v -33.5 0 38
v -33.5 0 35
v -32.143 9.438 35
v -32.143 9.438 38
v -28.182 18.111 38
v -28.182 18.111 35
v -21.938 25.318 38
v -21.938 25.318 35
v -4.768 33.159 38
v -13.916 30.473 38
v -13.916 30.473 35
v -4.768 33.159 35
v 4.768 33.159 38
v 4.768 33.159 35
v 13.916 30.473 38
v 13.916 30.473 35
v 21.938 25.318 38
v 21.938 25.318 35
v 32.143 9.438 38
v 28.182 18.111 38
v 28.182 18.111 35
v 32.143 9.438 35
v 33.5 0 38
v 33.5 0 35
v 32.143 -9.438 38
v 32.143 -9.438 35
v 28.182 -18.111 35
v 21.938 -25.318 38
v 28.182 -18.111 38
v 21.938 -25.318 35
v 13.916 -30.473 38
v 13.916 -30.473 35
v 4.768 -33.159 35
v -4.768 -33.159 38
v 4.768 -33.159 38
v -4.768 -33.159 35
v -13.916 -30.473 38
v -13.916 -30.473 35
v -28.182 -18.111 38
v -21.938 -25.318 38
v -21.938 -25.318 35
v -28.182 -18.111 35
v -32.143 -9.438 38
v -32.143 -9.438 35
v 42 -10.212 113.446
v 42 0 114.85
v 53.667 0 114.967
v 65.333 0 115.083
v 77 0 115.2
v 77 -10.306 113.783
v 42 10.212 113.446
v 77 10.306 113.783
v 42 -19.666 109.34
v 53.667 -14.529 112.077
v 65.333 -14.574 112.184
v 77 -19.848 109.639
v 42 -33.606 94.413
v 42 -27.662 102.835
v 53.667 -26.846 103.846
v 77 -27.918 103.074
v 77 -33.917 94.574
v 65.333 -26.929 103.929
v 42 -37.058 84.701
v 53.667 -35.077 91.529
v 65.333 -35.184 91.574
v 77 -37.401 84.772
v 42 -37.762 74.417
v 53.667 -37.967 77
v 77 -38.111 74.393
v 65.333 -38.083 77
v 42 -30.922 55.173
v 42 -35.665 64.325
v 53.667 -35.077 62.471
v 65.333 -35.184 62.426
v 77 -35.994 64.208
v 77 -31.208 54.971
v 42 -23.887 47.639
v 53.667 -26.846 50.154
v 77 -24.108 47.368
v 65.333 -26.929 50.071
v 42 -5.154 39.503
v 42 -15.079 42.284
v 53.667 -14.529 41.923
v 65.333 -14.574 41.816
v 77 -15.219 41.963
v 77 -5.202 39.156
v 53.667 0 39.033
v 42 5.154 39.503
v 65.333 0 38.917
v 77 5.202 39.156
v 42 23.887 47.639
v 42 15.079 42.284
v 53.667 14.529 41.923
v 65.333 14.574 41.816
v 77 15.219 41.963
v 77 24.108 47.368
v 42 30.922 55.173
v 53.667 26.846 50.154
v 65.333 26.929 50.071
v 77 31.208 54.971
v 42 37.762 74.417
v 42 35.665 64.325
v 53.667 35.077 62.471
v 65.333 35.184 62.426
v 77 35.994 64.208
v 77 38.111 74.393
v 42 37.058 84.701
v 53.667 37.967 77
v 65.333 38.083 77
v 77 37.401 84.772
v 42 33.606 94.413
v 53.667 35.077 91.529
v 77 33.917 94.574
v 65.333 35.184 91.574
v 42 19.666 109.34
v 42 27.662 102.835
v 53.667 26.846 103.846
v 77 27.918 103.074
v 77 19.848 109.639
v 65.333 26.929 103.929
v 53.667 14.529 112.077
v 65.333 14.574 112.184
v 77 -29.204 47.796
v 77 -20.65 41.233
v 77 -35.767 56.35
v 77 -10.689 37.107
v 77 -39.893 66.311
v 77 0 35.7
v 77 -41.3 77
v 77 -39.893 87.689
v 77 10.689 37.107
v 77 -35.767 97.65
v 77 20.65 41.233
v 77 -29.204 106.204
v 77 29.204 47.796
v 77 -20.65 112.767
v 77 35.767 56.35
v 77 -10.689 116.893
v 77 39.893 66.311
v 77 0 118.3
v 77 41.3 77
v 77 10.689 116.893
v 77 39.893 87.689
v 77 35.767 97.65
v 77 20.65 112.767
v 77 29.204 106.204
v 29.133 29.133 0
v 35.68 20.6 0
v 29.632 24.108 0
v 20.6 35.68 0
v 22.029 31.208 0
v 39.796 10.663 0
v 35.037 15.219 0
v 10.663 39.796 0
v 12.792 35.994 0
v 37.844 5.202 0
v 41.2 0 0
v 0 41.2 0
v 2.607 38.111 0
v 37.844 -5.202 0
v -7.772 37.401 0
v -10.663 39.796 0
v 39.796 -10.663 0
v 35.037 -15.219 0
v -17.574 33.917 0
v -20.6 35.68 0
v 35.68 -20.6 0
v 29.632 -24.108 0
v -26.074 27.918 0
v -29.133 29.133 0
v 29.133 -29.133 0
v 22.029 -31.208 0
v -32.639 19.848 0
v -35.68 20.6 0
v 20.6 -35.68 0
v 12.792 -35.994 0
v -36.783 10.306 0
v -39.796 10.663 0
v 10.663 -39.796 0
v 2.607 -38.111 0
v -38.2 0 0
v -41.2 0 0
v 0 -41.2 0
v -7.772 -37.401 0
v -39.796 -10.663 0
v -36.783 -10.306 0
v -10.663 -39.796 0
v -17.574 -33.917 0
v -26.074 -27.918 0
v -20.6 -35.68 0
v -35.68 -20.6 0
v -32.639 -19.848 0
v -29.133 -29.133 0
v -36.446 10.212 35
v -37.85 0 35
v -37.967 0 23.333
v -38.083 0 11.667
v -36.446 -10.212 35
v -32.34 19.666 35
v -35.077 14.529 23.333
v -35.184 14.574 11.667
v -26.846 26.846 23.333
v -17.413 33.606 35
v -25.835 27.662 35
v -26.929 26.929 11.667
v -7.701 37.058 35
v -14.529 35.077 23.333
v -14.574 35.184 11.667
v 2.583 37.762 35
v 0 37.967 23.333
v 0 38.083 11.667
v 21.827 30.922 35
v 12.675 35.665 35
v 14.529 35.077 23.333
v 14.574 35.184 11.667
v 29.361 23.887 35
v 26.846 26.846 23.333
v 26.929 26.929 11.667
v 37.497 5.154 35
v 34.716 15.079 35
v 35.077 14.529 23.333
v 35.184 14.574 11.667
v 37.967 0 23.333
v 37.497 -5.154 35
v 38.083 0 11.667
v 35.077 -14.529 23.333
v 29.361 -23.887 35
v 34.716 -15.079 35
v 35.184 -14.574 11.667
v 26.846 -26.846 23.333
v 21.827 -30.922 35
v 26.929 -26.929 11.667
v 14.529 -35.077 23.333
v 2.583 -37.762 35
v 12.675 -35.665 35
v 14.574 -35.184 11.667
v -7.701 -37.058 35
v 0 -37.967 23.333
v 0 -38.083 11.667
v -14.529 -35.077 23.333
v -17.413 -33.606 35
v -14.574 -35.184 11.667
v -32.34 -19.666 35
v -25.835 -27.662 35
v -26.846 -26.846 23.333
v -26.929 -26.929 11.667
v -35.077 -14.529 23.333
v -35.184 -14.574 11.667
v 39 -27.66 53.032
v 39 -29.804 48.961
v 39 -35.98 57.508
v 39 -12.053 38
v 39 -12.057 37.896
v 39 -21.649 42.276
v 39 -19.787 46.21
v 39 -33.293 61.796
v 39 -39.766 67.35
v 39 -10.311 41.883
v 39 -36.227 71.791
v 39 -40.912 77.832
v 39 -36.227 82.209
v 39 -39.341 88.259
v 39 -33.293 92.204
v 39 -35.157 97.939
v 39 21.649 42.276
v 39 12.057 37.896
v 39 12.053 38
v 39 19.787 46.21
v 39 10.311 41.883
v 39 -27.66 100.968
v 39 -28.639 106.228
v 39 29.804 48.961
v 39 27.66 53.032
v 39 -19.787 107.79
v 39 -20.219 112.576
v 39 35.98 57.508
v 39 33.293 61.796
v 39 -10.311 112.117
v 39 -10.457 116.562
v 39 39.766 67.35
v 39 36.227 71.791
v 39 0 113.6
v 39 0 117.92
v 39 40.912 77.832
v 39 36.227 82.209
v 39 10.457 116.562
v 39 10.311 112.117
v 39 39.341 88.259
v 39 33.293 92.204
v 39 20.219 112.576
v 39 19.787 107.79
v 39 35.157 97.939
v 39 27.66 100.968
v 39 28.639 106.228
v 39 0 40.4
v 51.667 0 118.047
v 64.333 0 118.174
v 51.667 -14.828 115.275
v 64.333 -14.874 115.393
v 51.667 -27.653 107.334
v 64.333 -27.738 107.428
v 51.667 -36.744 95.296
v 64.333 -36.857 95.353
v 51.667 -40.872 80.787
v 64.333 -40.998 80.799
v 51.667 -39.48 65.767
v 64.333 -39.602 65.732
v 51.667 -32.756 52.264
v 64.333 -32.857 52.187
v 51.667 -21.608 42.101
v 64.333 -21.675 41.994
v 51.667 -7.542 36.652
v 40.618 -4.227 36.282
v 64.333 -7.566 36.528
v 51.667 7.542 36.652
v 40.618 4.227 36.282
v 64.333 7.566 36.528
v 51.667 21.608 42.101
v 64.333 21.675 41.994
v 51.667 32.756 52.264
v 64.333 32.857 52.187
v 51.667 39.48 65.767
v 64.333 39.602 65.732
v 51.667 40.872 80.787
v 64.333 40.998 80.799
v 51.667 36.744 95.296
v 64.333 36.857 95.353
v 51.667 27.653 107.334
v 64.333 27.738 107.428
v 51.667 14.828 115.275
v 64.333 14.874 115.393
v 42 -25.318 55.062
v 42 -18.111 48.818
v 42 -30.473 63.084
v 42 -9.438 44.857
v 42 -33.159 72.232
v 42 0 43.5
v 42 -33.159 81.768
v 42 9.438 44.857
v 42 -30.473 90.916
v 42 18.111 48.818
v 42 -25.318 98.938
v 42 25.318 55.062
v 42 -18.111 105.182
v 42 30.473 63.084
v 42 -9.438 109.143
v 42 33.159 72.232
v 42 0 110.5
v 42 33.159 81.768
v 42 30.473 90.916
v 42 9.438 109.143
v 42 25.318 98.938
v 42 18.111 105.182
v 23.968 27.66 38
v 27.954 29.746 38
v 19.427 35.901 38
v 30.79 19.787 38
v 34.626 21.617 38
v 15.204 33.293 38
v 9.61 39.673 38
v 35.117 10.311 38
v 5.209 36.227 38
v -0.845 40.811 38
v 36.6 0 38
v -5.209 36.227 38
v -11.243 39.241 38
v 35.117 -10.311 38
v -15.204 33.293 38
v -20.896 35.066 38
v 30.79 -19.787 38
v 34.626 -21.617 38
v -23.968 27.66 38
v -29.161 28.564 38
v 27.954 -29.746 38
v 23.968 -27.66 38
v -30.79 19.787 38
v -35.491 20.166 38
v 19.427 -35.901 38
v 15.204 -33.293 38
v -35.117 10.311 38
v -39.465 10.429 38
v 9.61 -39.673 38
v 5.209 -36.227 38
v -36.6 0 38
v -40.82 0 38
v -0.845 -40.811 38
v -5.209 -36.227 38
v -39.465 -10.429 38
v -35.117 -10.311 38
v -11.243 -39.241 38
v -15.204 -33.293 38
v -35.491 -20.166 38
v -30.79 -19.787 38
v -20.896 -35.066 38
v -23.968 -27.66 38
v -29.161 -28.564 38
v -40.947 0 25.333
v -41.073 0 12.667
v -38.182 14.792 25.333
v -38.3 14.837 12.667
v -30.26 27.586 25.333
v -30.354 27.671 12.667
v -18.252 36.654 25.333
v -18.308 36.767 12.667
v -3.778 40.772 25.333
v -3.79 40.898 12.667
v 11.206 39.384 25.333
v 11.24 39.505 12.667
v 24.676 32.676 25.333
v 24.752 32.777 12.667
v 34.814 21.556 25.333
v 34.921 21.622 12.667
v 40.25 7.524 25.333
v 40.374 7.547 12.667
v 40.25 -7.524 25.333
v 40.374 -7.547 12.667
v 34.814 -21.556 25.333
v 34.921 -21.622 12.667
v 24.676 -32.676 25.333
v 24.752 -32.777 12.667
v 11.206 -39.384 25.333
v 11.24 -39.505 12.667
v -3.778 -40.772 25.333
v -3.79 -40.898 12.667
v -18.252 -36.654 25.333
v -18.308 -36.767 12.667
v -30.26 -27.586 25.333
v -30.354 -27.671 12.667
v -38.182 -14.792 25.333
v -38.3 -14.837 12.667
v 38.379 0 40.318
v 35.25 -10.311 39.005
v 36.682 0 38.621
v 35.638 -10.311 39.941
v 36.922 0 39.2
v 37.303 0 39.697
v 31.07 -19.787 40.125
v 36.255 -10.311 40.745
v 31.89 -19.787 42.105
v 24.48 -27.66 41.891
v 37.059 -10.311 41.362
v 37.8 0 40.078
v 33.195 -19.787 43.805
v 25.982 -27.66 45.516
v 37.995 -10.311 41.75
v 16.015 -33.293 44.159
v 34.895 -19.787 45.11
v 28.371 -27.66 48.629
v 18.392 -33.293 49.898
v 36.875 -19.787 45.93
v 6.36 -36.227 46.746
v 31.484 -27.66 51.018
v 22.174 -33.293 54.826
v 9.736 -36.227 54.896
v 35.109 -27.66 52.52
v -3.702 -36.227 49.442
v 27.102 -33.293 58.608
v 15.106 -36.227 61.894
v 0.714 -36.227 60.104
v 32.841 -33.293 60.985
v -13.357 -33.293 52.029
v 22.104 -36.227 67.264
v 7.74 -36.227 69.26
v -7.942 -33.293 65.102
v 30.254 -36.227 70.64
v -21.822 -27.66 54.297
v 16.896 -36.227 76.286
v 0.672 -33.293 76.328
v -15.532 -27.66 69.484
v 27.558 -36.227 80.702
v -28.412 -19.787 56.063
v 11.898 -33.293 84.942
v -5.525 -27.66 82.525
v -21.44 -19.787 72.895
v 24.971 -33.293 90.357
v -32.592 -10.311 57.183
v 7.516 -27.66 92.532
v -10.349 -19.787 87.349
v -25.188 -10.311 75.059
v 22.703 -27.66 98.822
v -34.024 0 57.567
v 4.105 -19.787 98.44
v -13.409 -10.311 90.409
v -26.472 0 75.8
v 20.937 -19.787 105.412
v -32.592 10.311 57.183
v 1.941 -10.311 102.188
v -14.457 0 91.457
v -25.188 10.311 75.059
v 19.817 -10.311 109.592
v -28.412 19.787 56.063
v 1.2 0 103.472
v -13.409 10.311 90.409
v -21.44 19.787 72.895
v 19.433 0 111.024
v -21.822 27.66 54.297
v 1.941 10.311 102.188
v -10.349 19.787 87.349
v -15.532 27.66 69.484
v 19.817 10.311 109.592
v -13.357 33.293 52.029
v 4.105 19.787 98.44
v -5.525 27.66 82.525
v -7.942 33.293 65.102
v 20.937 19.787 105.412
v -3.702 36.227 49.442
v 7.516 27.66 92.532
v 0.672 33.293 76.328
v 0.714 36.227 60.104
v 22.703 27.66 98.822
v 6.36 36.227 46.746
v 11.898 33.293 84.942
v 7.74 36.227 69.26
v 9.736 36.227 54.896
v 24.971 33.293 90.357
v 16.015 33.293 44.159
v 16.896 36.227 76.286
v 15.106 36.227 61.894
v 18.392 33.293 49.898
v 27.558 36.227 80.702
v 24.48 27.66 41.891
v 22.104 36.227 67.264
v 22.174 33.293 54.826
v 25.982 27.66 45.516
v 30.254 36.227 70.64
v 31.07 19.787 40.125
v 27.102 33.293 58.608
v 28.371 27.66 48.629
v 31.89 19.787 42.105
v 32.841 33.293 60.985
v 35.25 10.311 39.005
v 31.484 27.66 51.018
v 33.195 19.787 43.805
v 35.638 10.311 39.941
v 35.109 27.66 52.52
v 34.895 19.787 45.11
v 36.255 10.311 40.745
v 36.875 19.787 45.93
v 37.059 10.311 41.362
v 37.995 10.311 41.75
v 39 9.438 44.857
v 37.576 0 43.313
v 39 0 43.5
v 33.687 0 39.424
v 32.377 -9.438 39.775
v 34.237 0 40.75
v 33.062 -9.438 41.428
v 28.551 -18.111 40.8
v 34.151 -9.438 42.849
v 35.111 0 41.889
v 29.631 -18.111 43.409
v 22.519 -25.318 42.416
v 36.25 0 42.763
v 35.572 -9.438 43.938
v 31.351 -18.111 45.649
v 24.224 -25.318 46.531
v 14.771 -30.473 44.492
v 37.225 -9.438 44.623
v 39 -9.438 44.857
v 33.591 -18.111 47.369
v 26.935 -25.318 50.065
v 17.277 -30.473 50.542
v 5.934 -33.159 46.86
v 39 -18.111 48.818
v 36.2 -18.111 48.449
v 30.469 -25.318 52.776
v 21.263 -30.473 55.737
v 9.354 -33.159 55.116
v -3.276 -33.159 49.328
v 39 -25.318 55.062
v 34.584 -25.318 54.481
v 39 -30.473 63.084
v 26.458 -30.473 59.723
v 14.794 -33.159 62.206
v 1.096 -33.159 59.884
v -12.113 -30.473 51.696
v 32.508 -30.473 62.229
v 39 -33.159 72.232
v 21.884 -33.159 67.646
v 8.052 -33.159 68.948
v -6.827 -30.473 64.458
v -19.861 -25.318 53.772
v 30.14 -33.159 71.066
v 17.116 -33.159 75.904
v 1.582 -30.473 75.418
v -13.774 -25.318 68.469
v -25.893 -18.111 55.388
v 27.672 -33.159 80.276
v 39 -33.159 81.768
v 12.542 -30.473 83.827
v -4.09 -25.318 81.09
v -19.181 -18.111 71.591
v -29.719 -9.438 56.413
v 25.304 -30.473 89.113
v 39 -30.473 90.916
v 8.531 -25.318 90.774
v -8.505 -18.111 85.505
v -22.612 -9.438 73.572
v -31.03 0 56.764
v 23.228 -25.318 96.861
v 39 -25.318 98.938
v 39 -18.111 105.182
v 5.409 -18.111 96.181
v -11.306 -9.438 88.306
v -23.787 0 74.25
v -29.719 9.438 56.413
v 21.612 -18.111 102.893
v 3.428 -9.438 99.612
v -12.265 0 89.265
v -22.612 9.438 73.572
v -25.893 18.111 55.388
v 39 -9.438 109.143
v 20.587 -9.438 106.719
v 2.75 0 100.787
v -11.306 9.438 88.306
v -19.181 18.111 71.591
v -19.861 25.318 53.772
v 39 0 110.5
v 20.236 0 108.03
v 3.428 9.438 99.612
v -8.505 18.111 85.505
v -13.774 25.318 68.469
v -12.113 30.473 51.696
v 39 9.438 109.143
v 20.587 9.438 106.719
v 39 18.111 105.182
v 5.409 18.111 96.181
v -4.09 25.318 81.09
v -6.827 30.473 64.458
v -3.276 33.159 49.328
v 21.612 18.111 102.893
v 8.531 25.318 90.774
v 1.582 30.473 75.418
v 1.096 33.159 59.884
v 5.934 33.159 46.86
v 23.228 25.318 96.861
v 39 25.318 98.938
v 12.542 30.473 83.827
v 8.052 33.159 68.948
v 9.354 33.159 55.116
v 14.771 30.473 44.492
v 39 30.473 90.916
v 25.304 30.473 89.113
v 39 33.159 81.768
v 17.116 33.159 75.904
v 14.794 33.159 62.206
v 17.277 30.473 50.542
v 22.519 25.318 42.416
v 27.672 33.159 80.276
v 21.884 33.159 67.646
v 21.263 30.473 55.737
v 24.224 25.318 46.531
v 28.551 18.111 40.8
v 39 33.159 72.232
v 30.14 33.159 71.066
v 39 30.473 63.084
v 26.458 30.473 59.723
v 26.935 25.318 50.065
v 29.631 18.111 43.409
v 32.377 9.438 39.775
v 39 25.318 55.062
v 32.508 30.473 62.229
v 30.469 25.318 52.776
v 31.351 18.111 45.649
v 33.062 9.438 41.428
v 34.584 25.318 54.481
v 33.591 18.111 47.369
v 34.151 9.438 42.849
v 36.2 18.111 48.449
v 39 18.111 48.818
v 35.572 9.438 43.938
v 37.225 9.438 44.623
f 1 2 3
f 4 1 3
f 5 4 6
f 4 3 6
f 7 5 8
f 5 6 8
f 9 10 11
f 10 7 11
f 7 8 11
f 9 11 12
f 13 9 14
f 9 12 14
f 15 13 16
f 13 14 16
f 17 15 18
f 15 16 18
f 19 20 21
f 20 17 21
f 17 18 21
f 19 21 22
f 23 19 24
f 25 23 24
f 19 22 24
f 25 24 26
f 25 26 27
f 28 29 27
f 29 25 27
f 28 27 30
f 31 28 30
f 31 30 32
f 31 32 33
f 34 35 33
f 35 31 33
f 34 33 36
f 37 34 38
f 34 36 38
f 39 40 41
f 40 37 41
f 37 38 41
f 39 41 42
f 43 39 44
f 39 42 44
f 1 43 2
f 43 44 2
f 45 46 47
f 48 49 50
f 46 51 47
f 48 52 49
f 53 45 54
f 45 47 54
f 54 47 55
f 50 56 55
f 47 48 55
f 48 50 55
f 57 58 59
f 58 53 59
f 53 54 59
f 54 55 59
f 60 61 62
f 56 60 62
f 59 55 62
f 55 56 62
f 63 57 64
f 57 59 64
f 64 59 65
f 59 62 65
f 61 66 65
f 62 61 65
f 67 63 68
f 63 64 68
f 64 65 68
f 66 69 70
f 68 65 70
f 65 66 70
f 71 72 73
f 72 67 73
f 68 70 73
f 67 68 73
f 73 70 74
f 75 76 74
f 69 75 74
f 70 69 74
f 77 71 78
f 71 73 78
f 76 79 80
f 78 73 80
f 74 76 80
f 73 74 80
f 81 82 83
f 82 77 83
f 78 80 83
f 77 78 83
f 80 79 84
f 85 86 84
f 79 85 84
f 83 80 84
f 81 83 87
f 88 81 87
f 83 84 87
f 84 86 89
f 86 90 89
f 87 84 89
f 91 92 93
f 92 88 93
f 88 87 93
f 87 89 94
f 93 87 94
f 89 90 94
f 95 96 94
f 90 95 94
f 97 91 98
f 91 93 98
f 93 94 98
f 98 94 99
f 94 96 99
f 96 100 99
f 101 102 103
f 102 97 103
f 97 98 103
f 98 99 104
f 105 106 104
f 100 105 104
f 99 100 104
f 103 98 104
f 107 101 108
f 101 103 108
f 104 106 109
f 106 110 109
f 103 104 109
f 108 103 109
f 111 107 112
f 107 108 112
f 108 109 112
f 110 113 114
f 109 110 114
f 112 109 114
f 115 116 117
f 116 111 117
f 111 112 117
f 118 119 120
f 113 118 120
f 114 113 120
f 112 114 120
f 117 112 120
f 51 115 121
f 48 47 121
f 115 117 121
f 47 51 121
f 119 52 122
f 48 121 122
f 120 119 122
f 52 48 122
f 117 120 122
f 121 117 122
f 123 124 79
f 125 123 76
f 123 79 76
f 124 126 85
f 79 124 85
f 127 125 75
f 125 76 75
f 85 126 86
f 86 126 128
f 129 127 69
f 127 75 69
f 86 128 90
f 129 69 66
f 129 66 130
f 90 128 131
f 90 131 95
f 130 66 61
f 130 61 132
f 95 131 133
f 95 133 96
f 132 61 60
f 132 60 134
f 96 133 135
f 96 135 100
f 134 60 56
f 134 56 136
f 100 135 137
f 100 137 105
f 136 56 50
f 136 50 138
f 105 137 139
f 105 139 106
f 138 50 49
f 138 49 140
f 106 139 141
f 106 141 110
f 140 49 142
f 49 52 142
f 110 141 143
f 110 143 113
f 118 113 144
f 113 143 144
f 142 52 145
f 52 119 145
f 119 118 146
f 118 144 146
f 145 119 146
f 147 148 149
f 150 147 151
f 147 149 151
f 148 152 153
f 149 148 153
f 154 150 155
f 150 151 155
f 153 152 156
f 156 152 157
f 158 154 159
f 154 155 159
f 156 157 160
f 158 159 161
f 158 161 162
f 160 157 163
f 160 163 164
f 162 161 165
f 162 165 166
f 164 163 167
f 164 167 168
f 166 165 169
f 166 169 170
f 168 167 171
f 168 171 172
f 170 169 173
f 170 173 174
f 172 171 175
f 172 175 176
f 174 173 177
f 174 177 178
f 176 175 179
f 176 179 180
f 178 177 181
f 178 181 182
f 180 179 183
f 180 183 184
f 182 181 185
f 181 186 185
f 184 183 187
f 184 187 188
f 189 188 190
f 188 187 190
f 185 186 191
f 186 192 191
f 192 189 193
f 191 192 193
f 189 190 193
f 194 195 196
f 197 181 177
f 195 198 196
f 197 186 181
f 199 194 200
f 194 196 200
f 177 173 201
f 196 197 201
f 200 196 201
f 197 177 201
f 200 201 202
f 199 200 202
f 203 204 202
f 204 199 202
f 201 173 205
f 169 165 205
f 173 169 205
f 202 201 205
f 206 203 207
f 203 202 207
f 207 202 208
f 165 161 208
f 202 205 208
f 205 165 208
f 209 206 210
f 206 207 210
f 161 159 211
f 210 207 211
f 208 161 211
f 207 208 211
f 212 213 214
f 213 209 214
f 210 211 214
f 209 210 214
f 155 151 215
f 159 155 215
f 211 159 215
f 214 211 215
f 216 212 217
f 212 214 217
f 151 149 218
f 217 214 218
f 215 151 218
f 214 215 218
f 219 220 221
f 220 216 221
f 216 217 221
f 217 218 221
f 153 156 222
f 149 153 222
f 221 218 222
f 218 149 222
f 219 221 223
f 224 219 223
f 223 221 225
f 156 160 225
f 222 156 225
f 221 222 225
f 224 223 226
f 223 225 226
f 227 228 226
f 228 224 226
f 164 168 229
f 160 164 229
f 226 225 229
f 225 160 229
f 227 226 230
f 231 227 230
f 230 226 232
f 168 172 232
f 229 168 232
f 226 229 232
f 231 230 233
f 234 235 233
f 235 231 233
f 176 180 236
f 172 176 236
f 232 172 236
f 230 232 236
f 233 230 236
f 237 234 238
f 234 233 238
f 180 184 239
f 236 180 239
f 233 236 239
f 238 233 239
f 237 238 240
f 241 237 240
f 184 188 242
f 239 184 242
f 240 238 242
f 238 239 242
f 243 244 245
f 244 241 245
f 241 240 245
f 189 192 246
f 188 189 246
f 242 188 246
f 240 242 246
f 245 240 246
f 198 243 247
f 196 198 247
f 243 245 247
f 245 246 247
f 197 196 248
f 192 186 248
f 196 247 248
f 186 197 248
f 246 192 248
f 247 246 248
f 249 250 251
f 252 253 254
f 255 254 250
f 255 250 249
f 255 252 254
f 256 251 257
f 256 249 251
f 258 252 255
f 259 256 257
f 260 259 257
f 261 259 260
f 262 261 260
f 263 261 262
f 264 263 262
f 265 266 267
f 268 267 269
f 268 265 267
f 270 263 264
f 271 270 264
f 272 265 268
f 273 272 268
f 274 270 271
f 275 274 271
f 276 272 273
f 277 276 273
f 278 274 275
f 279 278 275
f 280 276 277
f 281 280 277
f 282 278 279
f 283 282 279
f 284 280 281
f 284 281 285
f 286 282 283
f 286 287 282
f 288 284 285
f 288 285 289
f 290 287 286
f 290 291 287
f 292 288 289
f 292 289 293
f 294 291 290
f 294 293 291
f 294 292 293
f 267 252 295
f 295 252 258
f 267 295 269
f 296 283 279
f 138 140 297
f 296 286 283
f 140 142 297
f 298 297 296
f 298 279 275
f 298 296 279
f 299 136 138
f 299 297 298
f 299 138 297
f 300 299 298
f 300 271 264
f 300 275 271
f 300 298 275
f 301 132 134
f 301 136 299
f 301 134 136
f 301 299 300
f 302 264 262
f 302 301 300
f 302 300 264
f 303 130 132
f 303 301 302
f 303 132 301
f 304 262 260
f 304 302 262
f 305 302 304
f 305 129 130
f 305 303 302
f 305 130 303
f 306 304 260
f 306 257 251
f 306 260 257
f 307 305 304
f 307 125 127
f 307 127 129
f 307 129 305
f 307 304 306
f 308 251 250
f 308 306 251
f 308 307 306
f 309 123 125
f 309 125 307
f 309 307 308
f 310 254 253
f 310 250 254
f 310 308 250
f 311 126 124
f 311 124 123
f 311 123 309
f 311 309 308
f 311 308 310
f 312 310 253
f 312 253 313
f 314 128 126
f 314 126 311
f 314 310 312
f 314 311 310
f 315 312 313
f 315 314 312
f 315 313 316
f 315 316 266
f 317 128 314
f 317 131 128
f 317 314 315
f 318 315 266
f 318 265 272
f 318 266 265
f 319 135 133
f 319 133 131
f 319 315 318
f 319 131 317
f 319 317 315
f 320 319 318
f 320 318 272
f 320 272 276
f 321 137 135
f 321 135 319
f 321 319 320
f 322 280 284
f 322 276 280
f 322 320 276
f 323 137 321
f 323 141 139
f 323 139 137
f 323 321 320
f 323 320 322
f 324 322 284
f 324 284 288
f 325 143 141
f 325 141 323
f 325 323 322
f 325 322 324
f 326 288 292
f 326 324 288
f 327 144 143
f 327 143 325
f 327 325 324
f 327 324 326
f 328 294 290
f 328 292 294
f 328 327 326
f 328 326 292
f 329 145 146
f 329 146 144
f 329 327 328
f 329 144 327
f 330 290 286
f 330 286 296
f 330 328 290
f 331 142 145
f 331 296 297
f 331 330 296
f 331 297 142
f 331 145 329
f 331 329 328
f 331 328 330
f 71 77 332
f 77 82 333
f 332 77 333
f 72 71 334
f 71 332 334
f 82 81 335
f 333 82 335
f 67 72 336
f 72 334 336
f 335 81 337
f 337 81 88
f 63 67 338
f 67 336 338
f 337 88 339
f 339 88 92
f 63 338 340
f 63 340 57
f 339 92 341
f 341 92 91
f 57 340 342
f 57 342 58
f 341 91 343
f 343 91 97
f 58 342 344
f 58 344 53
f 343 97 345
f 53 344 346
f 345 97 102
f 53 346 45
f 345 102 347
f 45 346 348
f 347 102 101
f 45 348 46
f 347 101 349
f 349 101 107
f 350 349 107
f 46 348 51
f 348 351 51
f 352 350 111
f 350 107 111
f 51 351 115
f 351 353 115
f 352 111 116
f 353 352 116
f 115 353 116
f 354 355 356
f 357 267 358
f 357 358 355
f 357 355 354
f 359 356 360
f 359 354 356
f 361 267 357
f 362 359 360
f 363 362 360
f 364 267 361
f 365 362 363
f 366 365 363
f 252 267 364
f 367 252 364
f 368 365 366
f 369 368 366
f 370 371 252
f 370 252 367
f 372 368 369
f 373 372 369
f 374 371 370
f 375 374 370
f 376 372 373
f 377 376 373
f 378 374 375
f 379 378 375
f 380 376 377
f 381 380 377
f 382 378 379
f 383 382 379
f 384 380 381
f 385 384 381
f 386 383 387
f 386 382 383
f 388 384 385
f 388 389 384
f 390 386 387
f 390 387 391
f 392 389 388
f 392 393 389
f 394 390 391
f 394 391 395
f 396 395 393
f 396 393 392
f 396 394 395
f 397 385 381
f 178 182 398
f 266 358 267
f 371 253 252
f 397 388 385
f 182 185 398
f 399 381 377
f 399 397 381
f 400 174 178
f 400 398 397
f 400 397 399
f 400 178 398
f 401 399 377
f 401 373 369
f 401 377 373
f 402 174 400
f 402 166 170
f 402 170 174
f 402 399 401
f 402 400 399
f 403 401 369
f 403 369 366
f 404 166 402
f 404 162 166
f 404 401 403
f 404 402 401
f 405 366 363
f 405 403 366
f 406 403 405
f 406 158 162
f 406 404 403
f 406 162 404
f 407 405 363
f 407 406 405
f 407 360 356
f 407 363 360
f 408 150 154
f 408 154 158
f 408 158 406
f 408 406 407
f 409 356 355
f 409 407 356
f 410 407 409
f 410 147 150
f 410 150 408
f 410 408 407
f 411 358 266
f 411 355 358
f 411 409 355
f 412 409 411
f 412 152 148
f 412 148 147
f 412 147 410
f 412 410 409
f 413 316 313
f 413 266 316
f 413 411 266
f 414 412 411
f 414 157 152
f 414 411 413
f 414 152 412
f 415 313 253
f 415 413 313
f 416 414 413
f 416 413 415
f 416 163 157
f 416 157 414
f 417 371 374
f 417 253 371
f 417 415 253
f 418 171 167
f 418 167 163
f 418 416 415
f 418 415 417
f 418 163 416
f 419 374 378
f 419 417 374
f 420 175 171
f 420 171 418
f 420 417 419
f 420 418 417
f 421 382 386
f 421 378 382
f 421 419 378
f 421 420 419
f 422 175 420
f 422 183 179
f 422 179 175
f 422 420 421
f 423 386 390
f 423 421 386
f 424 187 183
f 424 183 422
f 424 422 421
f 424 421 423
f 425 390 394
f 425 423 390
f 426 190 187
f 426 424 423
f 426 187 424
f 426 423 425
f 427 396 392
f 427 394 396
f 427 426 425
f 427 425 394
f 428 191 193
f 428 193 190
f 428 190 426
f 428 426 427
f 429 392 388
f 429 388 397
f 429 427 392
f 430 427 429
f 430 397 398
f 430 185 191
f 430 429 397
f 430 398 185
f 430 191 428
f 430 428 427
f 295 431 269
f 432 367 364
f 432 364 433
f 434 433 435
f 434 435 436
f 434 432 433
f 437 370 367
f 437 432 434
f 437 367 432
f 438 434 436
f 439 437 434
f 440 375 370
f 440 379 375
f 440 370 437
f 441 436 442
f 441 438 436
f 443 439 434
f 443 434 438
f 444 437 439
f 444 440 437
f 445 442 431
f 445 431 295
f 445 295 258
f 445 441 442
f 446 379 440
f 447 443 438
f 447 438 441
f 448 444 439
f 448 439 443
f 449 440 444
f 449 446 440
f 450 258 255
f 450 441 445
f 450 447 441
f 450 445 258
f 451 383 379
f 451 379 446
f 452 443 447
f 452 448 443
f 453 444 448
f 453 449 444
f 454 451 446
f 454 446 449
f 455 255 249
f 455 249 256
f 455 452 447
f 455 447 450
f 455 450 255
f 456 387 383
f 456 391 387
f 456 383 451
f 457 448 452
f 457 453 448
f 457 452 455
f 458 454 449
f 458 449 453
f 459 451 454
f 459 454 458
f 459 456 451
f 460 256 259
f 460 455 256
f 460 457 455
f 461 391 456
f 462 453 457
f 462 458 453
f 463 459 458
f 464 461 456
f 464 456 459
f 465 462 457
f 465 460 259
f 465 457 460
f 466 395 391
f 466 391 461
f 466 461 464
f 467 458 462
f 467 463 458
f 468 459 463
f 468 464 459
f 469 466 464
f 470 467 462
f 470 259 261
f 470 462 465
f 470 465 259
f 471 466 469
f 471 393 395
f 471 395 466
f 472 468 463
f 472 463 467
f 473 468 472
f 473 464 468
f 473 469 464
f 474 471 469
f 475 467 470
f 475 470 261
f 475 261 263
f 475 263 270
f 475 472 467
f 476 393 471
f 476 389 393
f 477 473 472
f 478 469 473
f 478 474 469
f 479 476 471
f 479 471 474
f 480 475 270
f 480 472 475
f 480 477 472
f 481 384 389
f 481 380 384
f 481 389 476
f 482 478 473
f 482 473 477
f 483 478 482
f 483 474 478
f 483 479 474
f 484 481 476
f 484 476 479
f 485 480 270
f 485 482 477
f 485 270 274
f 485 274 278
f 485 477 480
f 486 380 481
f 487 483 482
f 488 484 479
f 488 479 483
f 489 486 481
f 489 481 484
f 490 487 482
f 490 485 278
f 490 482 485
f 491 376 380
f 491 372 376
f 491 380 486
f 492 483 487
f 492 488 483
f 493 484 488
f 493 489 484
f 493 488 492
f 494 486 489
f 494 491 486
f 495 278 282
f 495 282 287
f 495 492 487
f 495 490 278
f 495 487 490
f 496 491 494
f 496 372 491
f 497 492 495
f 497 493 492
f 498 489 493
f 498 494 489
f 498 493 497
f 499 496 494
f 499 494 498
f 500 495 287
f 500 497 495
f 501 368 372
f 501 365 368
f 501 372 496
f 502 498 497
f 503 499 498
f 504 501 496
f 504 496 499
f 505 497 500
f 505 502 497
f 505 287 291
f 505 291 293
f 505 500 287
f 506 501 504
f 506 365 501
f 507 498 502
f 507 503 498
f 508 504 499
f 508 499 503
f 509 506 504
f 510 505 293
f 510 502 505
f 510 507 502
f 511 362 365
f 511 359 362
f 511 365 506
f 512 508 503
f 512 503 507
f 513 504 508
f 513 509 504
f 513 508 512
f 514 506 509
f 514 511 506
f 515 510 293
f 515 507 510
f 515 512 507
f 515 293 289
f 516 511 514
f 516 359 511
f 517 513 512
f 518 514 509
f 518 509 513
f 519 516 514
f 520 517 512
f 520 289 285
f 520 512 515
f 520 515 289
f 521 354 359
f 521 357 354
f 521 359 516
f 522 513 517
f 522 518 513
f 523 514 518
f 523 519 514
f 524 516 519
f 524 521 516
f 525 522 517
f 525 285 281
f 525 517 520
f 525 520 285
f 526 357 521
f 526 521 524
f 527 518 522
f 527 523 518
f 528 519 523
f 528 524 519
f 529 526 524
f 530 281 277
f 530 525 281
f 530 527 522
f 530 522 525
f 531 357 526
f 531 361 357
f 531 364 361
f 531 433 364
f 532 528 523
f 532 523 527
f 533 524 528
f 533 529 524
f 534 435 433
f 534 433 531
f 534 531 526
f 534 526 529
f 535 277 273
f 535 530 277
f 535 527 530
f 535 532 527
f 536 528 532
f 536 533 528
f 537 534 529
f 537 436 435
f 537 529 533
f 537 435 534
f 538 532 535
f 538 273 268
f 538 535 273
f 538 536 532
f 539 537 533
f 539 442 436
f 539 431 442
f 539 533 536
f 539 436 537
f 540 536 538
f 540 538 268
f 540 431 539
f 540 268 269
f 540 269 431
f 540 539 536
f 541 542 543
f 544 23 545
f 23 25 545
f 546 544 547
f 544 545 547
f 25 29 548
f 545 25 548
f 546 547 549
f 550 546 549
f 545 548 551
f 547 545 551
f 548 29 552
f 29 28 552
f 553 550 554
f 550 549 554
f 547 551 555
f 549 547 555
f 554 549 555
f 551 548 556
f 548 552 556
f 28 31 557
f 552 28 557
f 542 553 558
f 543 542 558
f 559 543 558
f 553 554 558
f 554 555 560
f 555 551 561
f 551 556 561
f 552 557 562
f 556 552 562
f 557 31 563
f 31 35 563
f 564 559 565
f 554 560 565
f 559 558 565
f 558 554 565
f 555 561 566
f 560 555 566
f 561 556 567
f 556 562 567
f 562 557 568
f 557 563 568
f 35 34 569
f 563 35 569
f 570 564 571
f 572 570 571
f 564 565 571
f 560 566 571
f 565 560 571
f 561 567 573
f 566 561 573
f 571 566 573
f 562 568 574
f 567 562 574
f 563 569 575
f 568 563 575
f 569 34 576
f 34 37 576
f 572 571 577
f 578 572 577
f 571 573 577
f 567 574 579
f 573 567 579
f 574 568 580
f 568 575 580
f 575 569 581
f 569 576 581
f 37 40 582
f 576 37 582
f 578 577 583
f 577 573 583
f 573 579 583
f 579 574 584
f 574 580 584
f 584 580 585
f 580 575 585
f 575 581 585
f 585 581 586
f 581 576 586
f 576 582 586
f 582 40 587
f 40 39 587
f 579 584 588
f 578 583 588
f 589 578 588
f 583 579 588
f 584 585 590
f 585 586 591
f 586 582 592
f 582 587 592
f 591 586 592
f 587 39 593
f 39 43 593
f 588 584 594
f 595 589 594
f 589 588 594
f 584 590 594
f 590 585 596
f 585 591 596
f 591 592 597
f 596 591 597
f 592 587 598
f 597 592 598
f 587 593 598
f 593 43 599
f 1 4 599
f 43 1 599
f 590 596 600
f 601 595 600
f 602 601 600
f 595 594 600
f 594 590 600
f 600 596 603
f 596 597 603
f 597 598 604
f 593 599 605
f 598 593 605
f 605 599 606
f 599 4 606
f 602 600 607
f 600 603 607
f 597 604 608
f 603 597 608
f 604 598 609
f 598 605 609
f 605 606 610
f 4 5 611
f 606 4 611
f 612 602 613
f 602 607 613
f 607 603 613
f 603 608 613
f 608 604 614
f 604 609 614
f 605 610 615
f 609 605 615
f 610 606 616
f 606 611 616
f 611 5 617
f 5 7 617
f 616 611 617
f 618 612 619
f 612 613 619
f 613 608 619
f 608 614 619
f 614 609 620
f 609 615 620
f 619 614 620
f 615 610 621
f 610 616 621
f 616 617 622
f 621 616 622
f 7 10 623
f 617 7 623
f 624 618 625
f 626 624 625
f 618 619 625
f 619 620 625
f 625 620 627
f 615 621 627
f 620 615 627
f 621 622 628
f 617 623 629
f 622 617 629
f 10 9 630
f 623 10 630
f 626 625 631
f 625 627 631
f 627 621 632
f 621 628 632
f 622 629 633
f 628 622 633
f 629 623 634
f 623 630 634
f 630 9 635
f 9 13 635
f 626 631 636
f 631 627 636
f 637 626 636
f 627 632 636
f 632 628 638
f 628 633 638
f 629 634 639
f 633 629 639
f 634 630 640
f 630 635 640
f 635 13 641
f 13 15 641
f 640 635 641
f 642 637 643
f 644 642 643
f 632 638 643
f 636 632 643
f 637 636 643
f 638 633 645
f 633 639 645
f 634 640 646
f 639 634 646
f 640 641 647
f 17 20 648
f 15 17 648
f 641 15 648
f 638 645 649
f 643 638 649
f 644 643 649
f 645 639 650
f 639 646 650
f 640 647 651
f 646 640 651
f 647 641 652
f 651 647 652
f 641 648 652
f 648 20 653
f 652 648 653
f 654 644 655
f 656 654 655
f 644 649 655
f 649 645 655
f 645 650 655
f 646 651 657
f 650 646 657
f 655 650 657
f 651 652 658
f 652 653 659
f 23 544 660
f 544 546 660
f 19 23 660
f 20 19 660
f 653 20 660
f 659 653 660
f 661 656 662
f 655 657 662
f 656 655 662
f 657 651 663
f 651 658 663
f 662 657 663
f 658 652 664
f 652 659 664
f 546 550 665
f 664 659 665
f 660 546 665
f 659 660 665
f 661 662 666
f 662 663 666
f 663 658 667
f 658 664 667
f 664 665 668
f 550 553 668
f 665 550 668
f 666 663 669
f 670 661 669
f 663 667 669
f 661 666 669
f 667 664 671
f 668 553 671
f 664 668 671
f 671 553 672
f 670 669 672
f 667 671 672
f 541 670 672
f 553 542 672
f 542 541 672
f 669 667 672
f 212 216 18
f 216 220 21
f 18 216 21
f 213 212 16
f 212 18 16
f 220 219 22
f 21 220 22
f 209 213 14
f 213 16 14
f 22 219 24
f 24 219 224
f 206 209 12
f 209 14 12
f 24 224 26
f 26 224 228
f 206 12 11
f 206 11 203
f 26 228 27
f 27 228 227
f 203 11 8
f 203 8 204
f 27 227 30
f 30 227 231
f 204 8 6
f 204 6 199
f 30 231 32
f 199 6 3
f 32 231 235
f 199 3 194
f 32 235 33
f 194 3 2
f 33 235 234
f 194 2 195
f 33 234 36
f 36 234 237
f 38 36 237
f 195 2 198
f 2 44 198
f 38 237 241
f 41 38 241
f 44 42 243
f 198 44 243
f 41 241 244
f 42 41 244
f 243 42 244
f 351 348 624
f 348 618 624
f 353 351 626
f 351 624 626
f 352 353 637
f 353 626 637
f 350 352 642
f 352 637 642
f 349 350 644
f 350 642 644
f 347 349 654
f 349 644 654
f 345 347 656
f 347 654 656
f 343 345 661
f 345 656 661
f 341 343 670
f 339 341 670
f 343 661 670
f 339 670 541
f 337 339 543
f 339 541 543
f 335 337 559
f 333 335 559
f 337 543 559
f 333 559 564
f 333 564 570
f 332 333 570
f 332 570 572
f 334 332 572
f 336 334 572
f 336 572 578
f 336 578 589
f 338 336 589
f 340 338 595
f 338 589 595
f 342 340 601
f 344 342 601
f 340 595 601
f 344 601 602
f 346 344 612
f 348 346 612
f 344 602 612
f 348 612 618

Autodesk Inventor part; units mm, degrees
ref_plane "YZ Plane" through (0, 0, 0) normal (1, 0, 0) x (0, 1, 0)
ref_plane "XZ Plane" through (0, 0, 0) normal (0, 1, 0) x (-1, 0, 0)
ref_plane "XY Plane" through (0, 0, 0) normal (0, 0, 1) x (1, 0, 0)
sketch "Sketch1" plane through (0, 0, 0) normal (0, 1, 0) x (-1, 0, 0)
  line L0 (0, 0) -> (0, 38)
  line L1 (41.2001, 0) -> (0, 0)
  line L2 (0, 38) -> (40.8201, 38)
  line L3 (37.85, 35) -> (38.2, 0)
  line L4 (41.2001, 0) -> (40.8201, 38)
  line L5 (33.5, 38) -> (33.5, 35)
  line L6 (33.5, 35) -> (37.85, 35)
  line L7 (33.5, 35) -> (0, 35) construction
  dimension "d0" = 76.4
  dimension "d3" = 75.7
  dimension "d4" = 3
  dimension "d5" = 35
  dimension "d6" = 3
  dimension "d7" = 67
revolve "Revolution1" add sketch "Sketch1" angle 360 about axis through (0, 0, 0) along (0, 0, 1) contours L3 L6 L5 L2 L4 L1
sketch "Sketch2" plane through (0, 0, 38) normal (0, 0, 1) x (1, 0, 0)
  circle A0 centre (0, 0) radius 40.8201 projected
  circle A1 centre (0, 0) radius 33.5 projected
  circle A2 centre (0, 0) radius 36.6
  circle A3 centre (0, 0) radius 33.5
  dimension "d8" = 67
  dimension "d9" = 3.1
sketch "Sketch3" plane through (0, 0, 0) normal (0, 1, 0) x (-1, 0, 0)
  arc A0 (0, 38) -> (-39, 77) centre (-39, 38) ccw
  dimension "d10" = 39
  dimension "d11" = 39
  dimension "d12" = 39
sweep "Sweep1" add profiles "Sketch2" path "Sketch3" contours A2
sketch "Sketch4" plane through (0, 0, 0) normal (0, 1, 0) x (-1, 0, 0)
  line L0 (-39, 43.5) -> (-39, 110.5) projected
  line L1 (-77, 77) -> (-39, 77)
  line L2 (-39, 77) -> (-39, 117.9202)
  line L3 (-39, 117.9202) -> (-77, 118.3002)
  line L4 (-77, 118.3002) -> (-77, 77)
  line L5 (-77, 115.2) -> (-42, 114.85)
  line L6 (-42, 117.9502) -> (-42, 110.5)
  line L7 (-42, 110.5) -> (-39, 110.5)
  line L8 (-42, 110.5) -> (-42, 77) construction
  dimension "d14" = 3.1
  dimension "d15" = 35
  dimension "d16" = 3
  dimension "d17" = 76.4
  dimension "d18" = 75.7
  dimension "d19" = 67
revolve "Revolution2" add sketch "Sketch4" angle 360 about axis through (77, 0, 77) along (-1, 0, 0) contours L7 L6 L3 L2 | L4 L3 L6 L5
equation "\"d0\" = d1"
equation "\"d3\" = d2"
equation "\"d4\" = t2"
equation "\"d5\" = l1"
equation "\"d6\" = t2"
equation "\"d7\" = d"
equation "\"d8\" = d"
equation "\"d9\" = t1"
equation "\"d10\" = Z - t2"
equation "\"d11\" = Z - t2"
equation "\"d12\" = Z - t2"
equation "\"d14\" = t1"
equation "\"d15\" = l1"
equation "\"d16\" = t2"
equation "\"d17\" = d1"
equation "\"d18\" = d2"
equation "\"d19\" = d"
equation "\"d\" = 67"
equation "\"d1\" = 76.4"
equation "\"d2\" = 75.7"
equation "\"l1\" = 35"
equation "\"L\" = 77"
equation "\"t1\" = 3.1"
equation "\"t2\" = 3"
equation "\"Z\" = 42"
properties part number "JIS K 6739 90 Deg Elbow (DL) 65" material "PVC, Unplasticized"
